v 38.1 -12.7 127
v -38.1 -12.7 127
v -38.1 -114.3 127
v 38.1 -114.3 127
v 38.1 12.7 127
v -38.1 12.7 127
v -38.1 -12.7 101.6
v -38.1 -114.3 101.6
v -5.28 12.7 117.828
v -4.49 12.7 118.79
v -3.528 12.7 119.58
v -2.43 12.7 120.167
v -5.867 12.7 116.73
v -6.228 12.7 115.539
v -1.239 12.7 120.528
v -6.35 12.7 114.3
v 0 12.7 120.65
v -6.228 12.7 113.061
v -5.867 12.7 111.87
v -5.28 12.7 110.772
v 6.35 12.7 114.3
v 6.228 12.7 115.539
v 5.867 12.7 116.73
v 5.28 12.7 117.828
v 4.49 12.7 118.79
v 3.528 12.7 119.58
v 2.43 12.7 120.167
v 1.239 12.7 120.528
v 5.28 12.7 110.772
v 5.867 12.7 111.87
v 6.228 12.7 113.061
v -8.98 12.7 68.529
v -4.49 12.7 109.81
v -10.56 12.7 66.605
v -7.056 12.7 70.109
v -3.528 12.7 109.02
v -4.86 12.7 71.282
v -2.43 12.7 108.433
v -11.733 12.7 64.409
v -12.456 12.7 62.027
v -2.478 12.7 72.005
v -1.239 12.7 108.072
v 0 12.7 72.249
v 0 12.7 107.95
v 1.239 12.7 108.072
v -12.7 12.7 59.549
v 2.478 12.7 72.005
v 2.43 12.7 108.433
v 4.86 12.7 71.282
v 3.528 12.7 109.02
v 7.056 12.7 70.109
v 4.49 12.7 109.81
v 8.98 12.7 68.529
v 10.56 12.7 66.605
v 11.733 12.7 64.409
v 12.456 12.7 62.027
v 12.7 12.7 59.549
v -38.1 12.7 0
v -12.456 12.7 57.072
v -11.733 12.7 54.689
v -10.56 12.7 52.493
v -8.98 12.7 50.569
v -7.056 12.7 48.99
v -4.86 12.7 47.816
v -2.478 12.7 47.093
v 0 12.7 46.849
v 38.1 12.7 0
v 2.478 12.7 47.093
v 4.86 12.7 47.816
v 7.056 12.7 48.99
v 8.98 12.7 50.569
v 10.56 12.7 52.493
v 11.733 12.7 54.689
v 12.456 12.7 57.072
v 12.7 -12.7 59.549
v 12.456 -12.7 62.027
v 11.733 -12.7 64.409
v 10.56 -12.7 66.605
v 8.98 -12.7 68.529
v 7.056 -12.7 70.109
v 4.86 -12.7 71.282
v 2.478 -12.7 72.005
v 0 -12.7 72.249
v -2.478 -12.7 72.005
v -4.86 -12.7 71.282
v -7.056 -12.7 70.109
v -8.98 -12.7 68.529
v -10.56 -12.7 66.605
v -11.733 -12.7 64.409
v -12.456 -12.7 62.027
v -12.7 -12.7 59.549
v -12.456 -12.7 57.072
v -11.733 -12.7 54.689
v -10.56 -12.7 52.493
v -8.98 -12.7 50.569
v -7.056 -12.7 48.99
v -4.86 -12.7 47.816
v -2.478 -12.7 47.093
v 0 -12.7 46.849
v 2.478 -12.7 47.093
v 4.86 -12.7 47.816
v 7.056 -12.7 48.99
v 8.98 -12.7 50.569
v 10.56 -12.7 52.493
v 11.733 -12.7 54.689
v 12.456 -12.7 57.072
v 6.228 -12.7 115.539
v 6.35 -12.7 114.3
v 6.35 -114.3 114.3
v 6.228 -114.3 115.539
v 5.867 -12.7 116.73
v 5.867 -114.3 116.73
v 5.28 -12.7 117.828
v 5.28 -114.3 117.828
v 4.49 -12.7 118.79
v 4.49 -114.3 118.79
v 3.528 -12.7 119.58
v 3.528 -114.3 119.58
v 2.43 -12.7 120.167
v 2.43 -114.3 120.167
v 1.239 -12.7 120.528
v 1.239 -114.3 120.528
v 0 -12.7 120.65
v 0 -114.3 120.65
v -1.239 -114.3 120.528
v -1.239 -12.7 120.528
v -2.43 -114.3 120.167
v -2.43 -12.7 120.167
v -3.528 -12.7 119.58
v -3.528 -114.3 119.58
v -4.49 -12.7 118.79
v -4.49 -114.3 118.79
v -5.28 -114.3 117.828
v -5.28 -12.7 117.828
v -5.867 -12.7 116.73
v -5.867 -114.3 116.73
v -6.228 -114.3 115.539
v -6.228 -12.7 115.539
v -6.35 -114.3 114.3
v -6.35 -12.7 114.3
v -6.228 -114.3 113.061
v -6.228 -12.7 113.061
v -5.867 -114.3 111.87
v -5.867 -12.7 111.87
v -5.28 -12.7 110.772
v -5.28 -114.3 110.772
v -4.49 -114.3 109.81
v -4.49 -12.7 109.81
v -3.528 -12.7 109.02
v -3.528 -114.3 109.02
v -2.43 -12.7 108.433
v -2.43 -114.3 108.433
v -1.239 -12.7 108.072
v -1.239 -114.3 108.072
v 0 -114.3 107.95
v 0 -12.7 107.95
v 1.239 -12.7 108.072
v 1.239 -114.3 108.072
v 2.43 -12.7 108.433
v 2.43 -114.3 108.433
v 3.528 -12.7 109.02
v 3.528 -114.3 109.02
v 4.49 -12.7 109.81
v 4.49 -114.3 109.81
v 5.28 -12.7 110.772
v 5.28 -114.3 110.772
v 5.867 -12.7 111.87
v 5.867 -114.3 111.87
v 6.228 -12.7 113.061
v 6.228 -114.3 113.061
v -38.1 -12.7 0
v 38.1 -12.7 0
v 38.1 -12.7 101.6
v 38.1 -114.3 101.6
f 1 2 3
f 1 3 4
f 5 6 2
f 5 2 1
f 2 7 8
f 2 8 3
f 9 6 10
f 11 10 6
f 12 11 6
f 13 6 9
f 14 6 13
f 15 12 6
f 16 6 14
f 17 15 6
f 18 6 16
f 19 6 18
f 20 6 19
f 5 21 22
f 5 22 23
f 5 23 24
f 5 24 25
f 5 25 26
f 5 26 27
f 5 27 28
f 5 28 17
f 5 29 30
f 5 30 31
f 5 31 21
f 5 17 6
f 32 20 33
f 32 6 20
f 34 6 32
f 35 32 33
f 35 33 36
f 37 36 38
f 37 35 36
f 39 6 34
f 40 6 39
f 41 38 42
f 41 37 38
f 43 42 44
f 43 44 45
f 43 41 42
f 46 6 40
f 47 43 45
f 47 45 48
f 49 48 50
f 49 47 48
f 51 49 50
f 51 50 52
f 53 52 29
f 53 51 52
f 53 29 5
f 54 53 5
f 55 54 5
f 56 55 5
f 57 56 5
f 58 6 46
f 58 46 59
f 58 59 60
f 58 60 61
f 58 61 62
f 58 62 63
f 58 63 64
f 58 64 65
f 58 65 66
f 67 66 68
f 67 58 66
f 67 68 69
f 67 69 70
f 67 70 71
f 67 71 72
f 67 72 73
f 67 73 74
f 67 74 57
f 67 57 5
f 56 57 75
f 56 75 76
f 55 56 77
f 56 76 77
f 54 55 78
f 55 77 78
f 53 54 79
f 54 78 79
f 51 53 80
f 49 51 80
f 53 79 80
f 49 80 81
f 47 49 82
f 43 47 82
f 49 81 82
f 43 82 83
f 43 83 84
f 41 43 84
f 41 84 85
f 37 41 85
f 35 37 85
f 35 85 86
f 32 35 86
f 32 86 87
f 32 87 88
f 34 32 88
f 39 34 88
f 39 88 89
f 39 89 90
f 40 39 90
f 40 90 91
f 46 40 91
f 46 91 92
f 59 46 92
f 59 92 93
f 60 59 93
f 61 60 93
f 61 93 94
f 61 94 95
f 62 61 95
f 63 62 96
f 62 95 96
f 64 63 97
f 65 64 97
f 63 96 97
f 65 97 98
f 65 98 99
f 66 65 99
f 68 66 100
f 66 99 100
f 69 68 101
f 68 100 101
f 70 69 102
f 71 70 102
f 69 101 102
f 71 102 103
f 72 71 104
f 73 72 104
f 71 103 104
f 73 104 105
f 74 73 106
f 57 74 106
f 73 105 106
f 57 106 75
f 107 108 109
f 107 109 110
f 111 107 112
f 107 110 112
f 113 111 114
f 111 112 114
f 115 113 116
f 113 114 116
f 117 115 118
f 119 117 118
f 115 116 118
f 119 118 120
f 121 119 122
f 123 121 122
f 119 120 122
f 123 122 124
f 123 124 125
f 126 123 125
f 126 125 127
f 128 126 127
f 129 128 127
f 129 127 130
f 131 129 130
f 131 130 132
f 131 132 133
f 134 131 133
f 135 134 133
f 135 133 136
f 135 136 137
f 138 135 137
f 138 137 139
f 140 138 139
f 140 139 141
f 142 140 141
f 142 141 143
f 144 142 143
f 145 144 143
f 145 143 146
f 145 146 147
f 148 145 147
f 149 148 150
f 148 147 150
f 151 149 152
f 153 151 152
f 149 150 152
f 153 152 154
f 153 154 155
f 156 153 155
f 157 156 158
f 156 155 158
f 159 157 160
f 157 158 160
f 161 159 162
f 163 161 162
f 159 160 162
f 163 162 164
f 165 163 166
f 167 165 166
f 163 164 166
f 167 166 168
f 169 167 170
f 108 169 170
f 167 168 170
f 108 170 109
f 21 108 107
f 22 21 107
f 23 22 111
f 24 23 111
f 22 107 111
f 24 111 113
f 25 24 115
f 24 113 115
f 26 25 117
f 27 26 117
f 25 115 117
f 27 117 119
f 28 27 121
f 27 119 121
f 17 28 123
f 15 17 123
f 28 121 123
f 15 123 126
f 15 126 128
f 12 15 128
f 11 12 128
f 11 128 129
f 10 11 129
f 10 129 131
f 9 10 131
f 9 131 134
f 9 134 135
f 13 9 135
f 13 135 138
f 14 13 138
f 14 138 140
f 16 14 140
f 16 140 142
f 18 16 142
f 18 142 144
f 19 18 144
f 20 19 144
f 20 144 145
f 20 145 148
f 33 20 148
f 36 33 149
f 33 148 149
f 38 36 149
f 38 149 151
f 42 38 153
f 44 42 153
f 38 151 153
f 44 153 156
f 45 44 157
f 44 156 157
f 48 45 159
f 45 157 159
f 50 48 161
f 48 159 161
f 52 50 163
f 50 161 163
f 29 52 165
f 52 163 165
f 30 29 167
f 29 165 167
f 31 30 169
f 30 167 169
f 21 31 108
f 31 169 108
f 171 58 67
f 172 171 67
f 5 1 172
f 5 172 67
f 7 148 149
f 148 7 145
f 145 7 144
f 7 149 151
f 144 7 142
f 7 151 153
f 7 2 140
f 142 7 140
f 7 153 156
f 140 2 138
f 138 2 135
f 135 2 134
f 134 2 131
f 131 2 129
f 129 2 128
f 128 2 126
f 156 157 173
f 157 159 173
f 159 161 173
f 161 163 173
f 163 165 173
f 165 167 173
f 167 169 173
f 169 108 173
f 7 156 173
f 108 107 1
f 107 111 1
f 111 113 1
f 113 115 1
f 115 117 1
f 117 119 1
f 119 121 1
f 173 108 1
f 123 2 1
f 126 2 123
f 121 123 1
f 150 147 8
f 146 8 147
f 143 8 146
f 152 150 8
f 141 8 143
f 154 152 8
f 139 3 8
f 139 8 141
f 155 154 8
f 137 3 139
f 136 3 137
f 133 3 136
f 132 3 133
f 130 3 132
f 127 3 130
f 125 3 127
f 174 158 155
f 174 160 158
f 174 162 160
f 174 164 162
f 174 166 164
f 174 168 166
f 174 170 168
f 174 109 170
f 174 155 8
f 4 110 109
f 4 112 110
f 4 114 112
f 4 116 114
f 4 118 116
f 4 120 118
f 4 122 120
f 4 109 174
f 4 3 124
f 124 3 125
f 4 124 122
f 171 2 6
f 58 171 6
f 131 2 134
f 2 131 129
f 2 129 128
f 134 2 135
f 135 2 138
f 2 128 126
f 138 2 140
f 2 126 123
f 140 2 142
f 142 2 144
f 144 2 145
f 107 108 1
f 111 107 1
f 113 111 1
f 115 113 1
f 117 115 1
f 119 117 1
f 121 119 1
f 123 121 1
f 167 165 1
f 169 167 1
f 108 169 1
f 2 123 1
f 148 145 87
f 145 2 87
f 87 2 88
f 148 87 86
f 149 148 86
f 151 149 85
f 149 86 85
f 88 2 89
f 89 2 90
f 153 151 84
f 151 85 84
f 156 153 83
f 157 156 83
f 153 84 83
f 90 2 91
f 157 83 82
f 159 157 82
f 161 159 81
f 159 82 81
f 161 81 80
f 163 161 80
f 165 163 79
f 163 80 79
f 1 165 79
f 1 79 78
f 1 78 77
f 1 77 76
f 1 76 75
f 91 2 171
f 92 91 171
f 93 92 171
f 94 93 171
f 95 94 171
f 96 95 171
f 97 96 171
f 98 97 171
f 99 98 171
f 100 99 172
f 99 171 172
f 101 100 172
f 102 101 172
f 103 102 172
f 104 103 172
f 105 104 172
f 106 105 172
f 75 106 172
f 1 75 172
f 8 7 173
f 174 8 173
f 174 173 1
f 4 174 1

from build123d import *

# Parameters (mm, degrees)
F0_W     = 76.2
F0_H     = 25.4
F1_DEPTH = 127
F2_R     = 12.7
F3_DEPTH = 25.401
F4_W     = 76.2
F4_H     = 25.4
F5_DEPTH = 101.6
F6_R     = 6.35
F7_DEPTH = 127.001
F8_R     = 6.35
F9_DEPTH = 25.401


with BuildPart() as f1:
    # F0 (on Top) → F1 (new body)
    with BuildSketch(Plane.XY):
        Rectangle(F0_W, F0_H)
    extrude(amount=F1_DEPTH)

    # F2 (on face) → F3 (cut, through all)
    with BuildSketch(Plane.XZ.offset(12.7)):
        with Locations((0, 59.5492098594)):
            Circle(F2_R)
    extrude(amount=-F3_DEPTH, mode=Mode.SUBTRACT)


with BuildPart() as f5:
    # F4 (on face) → F5 (new body)
    with BuildSketch(Plane.XZ.offset(12.7)):
        with Locations((0, 114.3)):
            Rectangle(F4_W, F4_H)
    extrude(amount=F5_DEPTH)


with BuildPart() as f7_tool:
    # F6 (on face) → F7 (new body, through all)
    with BuildSketch(Plane.XZ.offset(114.3)):
        with Locations((0, 114.3)):
            Circle(F6_R)
    extrude(amount=-F7_DEPTH)


with BuildPart() as f1_1:
    add(f1.part)

    # F7: cut by f7_tool
    add(f7_tool.part, mode=Mode.SUBTRACT)

    # F8 (on face) → F9 (cut, through all)
    with BuildSketch(Plane.XZ.offset(12.7)):
        with Locations((0, 114.3)):
            Circle(F8_R)
    extrude(amount=-F9_DEPTH, mode=Mode.SUBTRACT)


with BuildPart() as f5_1:
    add(f5.part)

    # F7: cut by f7_tool
    add(f7_tool.part, mode=Mode.SUBTRACT)


solid = Compound([f1_1.part, f5_1.part])
